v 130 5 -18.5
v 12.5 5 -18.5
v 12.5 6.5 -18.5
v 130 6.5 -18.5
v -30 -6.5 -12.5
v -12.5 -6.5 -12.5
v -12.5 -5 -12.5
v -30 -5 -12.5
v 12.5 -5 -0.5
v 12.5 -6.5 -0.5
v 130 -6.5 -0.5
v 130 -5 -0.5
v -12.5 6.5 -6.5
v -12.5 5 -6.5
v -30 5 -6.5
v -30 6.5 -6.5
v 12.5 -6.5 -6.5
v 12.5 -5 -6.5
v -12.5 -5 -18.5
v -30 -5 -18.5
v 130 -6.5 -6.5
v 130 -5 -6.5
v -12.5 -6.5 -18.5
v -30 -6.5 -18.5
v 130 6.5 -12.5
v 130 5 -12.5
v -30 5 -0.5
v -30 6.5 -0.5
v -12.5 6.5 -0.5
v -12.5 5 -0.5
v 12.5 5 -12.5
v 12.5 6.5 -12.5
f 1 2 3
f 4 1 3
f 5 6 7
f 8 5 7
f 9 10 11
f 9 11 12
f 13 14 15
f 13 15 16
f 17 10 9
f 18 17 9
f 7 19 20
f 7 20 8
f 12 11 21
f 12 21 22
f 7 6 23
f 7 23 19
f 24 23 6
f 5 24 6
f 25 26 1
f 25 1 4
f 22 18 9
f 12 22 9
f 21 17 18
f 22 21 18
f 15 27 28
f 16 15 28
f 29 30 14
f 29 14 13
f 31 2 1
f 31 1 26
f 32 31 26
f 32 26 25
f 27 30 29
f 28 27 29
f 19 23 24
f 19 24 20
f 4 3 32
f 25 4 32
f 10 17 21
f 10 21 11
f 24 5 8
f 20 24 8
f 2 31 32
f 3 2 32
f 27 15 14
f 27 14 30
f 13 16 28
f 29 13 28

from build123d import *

# Parameters (mm, degrees)
SKETCH023_W     = 1.5
SKETCH023_H     = 6
PAD010_DEPTH    = 130
SKETCH024_W     = 1.5
SKETCH024_H     = 6
PAD011_DEPTH    = 30
SKETCH025_W     = 35.455807
SKETCH025_H     = 33.450874
POCKET017_DEPTH = 12.5


with BuildPart() as part:
    # Sketch023 → Pad010 (new body)
    with BuildSketch(Plane.YZ):
        with Locations((-5.75, -3.5)):
            Rectangle(SKETCH023_W, SKETCH023_H)
        with Locations((5.75, -15.5)):
            Rectangle(SKETCH023_W, SKETCH023_H)
    extrude(amount=PAD010_DEPTH)

    # Sketch024 (on Sketch) → Pad011 (join)
    with BuildSketch(Plane.YZ):
        with Locations((5.75, -3.5)):
            Rectangle(SKETCH024_W, SKETCH024_H)
        with Locations((-5.75, -15.5)):
            Rectangle(SKETCH024_W, SKETCH024_H)
    extrude(amount=-PAD011_DEPTH)

    # Sketch025 → Pocket017 (cut, symmetric)
    with BuildSketch(Plane.YZ):
        with Locations((3.122594, -7.993252)):
            Rectangle(SKETCH025_W, SKETCH025_H)
    extrude(amount=POCKET017_DEPTH, both=True, mode=Mode.SUBTRACT)


solid = part.part
